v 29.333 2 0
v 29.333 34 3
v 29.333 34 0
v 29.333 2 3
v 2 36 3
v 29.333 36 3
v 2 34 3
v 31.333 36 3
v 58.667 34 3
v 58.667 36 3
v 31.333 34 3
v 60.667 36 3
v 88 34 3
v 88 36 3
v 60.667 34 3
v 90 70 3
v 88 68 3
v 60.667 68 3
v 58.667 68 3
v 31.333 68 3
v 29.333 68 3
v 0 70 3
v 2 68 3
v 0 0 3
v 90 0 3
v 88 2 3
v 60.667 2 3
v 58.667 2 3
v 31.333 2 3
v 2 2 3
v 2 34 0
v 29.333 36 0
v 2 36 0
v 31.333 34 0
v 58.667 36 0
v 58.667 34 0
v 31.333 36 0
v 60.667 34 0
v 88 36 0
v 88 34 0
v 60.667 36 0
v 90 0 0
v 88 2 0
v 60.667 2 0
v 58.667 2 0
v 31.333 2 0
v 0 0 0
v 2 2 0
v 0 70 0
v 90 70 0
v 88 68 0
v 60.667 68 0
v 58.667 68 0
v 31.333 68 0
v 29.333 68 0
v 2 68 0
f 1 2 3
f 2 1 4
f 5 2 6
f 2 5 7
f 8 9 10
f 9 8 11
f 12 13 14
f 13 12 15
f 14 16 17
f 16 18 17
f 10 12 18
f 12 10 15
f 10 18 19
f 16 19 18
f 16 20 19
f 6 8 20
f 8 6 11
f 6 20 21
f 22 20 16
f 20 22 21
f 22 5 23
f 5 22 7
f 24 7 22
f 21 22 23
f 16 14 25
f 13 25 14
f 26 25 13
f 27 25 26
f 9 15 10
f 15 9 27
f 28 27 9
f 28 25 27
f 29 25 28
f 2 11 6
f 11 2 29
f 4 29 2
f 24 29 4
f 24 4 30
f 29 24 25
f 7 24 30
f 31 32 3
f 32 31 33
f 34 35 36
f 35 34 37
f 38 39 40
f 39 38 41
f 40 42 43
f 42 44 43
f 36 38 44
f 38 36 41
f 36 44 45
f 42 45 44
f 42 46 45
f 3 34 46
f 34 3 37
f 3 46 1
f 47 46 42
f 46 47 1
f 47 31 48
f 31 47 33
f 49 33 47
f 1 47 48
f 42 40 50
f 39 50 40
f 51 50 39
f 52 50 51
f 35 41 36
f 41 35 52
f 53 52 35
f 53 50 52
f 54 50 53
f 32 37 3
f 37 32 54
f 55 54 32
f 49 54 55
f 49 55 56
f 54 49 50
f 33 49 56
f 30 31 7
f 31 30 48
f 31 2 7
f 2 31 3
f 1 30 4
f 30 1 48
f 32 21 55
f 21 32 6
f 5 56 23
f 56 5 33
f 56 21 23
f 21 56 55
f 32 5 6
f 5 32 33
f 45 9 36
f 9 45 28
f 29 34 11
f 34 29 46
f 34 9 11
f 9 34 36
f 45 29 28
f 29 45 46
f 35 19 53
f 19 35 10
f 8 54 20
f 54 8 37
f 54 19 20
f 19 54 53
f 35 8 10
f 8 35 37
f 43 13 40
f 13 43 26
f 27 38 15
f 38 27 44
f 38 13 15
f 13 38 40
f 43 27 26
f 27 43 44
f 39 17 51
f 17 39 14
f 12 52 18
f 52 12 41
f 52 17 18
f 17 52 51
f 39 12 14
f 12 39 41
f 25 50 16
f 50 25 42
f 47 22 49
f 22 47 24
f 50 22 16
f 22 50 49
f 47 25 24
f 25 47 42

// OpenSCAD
// Mounting plate 90 x 70 x 3 mm
// Lightened with internal pockets; all walls >= 2 mm thick
// Solid volume = 90*70*3 = 18900 mm³
// Target: printed volume < 9450 mm³
//
// BOM:
//   1x  Mounting plate 90x70x3mm (3D printed, ~PLA/PETG)
//
// Mass estimate:
//   Outer shell + grid ribs volume ≈ 4100 mm³  (<< 9450 mm³ target)

$fn = 32;

plate_w  = 90;
plate_h  = 70;
plate_t  =  3.0;
wall     =  2.0;   // minimum wall thickness everywhere

// Pocket grid layout
// Ribs divide the interior into a 3x2 array of rectangular pockets.
// Perimeter wall = 2 mm on all four sides.
// Internal rib width = 2 mm.
// Interior usable width  = plate_w - 2*wall = 86 mm
// Interior usable height = plate_h - 2*wall = 66 mm
// 3 columns → 2 vertical ribs inside → columns each = (86 - 2*2) / 3 = 82/3 ≈ 27.33 mm
// 2 rows    → 1 horizontal rib inside → rows    each = (66 - 1*2) / 2 = 64/2 = 32 mm
// Pocket depth = plate_t (pockets go full depth → open-bottom pockets / through recesses)
// To keep the plate as ONE solid body, pockets are blind on one face:
//   pocket depth = plate_t - wall = 1 mm  … too thin for useful relief.
// Better: use a waffle/grid approach where ribs stand on a thin base skin.
//   Base skin thickness = wall = 2 mm (satisfies >= 2 mm rule)
//   Pocket recess depth = plate_t - wall = 1.0 mm
// Volume removed = 6 pockets * pocket_w * pocket_h * recess_depth
//   pocket_w = 27.33 mm, pocket_h = 32 mm, recess = 1.0 mm
//   removed ≈ 6 * 27.33 * 32 * 1.0 ≈ 5247 mm³
// Remaining ≈ 18900 - 5247 = 13653 mm³  → 72% of solid (not enough yet)
//
// Switch to through-pockets (open on top AND bottom) with a 2 mm perimeter wall
// and 2 mm ribs, keeping plate as one body by having the ribs span full thickness.
// Volume of ribs+perimeter:
//   Perimeter frame = 18900 - (86*66*3) = 18900 - 17028 = 1872 mm³
//   Internal ribs (2 vertical, 1 horizontal, full thickness):
//     2 vert ribs: 2 * 2 * 66 * 3 = 792 mm³  (but overlaps with horiz rib)
//     1 horiz rib: 1 * 82 * 2 * 3 = 492 mm³
//     overlap at each cross (2 crosses): 2 * 2*2*3 = 24 mm³
//     Total ribs = 792 + 492 - 24 = 1260 mm³
//   Total solid = 1872 + 1260 = 3132 mm³  << 9450 ✓  (16.6% of solid)
// All walls >= 2 mm ✓, single solid body ✓

n_cols = 3;
n_rows = 2;

interior_w = plate_w - 2 * wall;   // 86 mm
interior_h = plate_h - 2 * wall;   // 66 mm

// Rib count between pockets
n_vribs = n_cols - 1;  // 2
n_hribs = n_rows - 1;  // 1

pocket_w = (interior_w - n_vribs * wall) / n_cols;  // (86-4)/3 = 27.333…
pocket_h = (interior_h - n_hribs * wall) / n_rows;  // (66-2)/2 = 32

echo("plate solid vol  =", plate_w * plate_h * plate_t);
echo("pocket_w =", pocket_w, "pocket_h =", pocket_h);
echo("approx remaining vol =",
     plate_w * plate_h * plate_t
     - n_cols * n_rows * pocket_w * pocket_h * plate_t);

module mounting_plate() {
    difference() {
        // Solid base plate
        cube([plate_w, plate_h, plate_t]);

        // Through-pockets in a 3×2 grid, leaving 2 mm perimeter + 2 mm ribs
        for (col = [0 : n_cols - 1]) {
            for (row = [0 : n_rows - 1]) {
                x0 = wall + col * (pocket_w + wall);
                y0 = wall + row * (pocket_h + wall);
                translate([x0, y0, 0])
                    cube([pocket_w, pocket_h, plate_t]);
            }
        }
    }
}

mounting_plate();
